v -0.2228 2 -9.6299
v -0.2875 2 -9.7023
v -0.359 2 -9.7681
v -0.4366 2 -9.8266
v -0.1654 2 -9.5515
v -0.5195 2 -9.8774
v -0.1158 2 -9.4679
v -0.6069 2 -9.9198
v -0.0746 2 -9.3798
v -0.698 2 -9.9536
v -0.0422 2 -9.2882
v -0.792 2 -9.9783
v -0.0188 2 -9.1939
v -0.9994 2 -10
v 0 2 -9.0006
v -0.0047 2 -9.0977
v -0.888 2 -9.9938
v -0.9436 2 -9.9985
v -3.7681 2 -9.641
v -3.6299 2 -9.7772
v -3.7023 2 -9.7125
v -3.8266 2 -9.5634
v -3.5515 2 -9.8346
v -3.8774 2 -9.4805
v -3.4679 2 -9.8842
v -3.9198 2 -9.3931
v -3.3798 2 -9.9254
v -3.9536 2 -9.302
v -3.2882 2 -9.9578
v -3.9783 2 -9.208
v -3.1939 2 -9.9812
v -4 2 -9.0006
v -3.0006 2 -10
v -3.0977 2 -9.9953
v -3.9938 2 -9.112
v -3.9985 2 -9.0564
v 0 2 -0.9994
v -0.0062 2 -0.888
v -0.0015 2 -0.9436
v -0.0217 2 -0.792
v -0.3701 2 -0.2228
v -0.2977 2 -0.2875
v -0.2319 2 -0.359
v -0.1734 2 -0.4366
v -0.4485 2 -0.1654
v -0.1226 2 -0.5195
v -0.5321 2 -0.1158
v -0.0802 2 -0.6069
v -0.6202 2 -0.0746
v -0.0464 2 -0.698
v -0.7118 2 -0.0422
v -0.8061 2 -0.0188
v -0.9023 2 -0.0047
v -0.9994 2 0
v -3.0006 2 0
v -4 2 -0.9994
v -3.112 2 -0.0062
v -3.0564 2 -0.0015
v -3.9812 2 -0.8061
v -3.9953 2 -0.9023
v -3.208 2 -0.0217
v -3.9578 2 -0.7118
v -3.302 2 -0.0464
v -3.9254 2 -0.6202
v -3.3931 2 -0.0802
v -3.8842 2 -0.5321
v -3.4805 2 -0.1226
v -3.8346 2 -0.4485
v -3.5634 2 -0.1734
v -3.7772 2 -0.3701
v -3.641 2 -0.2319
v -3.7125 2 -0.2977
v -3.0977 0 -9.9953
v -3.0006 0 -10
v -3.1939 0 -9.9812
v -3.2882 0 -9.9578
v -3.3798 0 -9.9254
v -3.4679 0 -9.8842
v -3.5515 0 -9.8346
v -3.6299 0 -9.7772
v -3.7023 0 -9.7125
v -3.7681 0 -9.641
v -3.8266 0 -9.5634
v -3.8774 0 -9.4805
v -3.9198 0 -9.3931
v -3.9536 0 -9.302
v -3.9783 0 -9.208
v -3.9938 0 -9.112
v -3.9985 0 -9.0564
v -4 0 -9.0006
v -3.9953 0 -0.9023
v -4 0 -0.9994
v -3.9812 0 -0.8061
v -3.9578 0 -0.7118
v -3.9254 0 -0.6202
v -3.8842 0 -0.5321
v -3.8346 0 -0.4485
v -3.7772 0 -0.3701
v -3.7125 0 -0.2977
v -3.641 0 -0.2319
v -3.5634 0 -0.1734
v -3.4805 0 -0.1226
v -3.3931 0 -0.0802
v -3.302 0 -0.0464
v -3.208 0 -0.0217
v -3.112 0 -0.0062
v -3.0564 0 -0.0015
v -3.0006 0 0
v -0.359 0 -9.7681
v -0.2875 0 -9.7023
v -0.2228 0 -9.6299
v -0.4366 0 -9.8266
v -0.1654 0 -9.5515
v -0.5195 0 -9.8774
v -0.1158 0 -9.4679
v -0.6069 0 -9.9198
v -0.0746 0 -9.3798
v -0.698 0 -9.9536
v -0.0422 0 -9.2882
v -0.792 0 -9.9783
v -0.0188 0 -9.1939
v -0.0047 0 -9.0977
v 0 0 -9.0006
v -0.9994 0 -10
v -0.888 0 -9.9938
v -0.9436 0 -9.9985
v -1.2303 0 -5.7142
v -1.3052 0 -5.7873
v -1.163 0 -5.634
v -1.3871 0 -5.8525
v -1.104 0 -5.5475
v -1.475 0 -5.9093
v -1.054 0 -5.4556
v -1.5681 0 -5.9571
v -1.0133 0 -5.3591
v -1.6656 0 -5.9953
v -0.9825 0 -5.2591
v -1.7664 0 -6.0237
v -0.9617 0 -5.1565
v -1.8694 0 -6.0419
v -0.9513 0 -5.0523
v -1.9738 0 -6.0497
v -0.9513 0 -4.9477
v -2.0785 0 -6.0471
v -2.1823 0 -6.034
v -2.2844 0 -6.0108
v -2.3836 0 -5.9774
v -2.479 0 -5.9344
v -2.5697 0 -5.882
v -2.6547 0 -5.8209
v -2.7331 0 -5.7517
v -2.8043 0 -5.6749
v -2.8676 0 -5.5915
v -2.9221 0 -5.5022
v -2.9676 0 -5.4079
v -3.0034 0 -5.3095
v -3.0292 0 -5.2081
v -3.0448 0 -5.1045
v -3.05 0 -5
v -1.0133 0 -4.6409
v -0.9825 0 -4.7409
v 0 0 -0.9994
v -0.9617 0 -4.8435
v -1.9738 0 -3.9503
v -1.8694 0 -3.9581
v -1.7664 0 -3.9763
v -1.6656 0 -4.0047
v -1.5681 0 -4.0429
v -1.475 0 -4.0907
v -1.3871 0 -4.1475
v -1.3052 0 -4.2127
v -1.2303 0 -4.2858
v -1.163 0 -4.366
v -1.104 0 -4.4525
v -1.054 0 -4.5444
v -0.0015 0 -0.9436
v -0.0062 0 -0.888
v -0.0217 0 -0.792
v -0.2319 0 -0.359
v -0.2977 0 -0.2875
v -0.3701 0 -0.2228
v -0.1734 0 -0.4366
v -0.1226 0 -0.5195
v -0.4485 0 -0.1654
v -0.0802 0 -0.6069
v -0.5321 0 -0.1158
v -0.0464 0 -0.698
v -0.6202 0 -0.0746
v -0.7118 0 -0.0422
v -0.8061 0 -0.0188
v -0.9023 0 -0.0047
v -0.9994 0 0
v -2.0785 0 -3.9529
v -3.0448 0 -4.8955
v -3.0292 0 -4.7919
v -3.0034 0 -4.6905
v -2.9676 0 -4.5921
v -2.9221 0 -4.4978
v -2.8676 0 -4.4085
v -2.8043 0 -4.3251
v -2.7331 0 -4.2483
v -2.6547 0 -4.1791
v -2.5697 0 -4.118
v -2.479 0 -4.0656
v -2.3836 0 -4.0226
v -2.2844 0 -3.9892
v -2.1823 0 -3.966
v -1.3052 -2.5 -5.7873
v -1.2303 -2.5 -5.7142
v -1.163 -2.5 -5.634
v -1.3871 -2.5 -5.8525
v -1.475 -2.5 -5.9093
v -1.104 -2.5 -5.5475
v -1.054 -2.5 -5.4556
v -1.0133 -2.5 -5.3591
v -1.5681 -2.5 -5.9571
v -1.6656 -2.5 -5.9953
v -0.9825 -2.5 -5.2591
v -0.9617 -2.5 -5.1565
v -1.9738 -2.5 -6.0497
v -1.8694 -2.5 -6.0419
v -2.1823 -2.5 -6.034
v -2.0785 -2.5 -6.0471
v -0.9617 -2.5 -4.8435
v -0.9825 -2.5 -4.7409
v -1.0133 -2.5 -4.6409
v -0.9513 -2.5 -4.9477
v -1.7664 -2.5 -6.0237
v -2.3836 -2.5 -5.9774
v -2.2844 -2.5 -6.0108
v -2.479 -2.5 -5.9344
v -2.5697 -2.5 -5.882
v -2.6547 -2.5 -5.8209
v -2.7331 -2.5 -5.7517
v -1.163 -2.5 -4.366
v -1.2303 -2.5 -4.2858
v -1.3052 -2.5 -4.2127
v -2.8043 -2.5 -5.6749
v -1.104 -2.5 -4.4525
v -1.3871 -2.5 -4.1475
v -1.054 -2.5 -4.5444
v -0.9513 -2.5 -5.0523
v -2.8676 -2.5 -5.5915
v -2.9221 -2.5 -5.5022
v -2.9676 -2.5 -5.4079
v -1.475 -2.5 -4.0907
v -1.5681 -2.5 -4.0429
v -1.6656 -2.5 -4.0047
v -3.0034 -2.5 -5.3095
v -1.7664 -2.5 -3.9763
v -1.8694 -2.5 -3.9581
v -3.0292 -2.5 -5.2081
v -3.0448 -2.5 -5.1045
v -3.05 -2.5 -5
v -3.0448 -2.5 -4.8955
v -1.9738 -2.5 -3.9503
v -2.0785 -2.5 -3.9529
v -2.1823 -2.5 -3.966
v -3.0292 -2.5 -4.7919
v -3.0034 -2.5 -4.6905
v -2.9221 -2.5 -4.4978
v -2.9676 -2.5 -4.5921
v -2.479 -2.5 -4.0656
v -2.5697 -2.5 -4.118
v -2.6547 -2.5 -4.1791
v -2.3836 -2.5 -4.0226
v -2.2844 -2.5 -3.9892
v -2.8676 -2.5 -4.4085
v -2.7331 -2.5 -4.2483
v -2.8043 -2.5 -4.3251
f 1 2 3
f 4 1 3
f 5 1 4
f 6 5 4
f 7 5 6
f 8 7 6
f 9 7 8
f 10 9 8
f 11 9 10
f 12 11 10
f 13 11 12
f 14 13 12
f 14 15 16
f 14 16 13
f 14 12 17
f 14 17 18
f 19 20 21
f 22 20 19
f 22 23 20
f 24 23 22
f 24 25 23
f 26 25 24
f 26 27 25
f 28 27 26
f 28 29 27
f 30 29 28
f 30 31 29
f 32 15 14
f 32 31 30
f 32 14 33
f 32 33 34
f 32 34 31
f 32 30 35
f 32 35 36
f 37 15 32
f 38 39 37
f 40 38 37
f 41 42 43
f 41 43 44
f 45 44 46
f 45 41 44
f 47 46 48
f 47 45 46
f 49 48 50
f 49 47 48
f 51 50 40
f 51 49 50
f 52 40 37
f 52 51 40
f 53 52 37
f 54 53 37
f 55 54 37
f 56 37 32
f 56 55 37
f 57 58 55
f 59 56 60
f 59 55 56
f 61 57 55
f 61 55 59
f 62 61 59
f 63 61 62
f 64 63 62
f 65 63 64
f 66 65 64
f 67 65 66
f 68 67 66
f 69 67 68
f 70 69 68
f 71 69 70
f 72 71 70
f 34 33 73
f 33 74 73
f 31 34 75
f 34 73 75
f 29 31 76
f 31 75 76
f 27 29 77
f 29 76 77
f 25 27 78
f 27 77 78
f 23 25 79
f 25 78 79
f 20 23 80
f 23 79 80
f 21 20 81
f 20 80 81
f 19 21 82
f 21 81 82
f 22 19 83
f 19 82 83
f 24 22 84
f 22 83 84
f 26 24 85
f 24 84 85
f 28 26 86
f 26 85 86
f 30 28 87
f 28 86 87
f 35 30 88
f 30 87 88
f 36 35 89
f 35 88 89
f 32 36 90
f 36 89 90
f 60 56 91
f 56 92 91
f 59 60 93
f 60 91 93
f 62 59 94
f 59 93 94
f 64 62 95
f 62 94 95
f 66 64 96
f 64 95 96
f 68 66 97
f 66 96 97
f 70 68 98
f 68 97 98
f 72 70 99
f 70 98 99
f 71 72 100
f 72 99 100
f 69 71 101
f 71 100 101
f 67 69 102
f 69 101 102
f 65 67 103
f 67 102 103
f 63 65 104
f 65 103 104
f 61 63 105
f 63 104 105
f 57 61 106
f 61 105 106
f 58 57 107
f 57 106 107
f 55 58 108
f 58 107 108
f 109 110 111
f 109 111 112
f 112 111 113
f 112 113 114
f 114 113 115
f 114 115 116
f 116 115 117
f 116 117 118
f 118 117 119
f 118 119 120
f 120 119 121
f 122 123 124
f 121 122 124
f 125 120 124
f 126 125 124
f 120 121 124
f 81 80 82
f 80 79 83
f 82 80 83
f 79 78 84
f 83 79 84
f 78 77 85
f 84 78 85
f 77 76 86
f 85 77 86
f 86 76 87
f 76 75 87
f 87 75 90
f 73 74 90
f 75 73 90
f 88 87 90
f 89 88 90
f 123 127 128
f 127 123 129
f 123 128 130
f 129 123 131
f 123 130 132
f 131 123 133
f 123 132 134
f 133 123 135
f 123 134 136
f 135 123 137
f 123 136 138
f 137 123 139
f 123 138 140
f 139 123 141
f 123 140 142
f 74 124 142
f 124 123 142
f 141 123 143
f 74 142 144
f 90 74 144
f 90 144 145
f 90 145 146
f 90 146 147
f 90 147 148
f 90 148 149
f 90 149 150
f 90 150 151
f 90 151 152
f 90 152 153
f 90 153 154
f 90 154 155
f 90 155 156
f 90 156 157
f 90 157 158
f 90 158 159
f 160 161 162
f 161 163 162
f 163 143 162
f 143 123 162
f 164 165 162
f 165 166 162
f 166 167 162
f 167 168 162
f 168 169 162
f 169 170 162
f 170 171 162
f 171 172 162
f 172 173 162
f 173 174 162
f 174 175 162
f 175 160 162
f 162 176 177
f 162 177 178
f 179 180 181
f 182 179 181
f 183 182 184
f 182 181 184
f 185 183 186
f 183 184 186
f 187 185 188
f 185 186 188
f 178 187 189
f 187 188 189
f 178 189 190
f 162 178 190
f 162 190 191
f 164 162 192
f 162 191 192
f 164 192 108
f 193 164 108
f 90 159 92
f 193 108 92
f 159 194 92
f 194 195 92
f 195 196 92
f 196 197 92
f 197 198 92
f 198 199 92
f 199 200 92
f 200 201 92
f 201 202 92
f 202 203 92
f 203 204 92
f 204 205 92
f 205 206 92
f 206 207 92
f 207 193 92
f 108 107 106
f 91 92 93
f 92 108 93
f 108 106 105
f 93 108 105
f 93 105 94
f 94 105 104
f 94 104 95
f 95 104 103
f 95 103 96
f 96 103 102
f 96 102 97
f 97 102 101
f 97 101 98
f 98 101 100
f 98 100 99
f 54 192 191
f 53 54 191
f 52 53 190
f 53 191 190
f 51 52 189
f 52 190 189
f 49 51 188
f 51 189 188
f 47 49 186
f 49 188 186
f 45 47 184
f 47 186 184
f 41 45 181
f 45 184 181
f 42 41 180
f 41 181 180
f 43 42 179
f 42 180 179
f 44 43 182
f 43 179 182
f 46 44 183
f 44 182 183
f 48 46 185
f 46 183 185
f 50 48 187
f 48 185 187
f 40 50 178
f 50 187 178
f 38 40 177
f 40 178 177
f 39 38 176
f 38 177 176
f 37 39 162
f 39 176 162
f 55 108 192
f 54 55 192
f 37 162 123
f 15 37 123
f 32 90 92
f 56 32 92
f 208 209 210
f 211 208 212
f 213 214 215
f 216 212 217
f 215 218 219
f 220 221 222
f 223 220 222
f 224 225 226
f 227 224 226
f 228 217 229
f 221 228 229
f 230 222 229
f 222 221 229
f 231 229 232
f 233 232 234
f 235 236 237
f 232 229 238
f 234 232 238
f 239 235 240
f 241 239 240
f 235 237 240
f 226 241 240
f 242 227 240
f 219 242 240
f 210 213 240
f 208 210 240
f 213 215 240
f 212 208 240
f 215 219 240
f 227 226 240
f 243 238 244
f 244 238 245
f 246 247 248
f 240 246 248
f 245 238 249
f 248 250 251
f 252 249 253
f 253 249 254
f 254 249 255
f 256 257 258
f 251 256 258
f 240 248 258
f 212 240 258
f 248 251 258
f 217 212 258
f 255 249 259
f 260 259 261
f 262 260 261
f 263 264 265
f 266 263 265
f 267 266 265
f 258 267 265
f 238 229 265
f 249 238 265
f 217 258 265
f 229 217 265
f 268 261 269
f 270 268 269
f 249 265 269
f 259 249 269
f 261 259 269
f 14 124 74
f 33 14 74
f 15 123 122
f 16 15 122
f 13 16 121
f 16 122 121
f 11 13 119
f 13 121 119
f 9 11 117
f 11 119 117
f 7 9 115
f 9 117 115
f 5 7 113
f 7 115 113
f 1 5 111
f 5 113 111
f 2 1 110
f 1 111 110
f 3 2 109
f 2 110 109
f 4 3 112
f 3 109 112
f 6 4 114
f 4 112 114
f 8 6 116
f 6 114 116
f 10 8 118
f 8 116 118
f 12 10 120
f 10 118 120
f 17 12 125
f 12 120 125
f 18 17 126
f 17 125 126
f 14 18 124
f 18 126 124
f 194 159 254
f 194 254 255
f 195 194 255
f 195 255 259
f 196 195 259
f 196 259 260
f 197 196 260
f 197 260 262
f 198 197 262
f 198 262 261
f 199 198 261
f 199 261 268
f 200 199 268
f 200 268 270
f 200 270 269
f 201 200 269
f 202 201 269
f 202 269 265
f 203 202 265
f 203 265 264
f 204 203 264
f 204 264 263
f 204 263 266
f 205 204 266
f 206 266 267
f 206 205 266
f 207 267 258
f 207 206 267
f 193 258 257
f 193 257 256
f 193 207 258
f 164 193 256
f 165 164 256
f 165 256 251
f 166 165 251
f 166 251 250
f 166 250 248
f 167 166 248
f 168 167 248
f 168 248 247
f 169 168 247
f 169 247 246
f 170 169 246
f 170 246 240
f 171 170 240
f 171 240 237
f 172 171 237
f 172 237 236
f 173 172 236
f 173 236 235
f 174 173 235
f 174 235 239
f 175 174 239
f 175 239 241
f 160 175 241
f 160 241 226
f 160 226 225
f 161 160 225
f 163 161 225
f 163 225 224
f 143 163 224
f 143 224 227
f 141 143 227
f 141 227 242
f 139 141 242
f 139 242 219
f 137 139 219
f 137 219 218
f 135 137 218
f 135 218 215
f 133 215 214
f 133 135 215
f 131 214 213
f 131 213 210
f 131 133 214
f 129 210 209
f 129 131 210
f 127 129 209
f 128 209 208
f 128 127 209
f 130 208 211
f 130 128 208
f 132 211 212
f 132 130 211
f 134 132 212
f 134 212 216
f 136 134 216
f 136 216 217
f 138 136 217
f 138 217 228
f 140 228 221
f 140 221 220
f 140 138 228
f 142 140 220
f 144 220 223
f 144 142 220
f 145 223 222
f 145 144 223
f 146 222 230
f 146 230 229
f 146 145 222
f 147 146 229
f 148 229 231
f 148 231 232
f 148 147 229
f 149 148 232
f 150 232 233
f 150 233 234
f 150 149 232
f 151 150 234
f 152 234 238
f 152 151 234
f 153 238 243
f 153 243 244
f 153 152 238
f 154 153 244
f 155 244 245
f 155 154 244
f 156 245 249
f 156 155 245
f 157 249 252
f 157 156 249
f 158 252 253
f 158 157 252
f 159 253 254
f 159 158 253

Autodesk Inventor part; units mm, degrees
ref_plane "YZ Plane" through (0, 0, 0) normal (1, 0, 0) x (0, 1, 0)
ref_plane "XZ Plane" through (0, 0, 0) normal (0, 1, 0) x (-1, 0, 0)
ref_plane "XY Plane" through (0, 0, 0) normal (0, 0, 1) x (1, 0, 0)
sketch "Sketch1" plane through (0, 0, 0) normal (0, 1, 0) x (-1, 0, 0)
  line L0 (0.9994, -10) -> (3.0006, -10)
  ellipse E0 centre (2.9994, -8.9994) end of major axis (3.7074, -9.7074) minor radius 1 (3.0006, -10) -> (4, -9.0006) ccw
  line L1 (4, -9.0006) -> (4, -0.9994)
  ellipse E1 centre (2.9994, -1.0006) end of major axis (3.7074, -0.2926) minor radius 1 (4, -0.9994) -> (3.0006, 0) ccw
  line L2 (3.0006, 0) -> (0.9994, 0)
  ellipse E2 centre (1.0006, -1.0006) end of major axis (1.7086, -1.7086) minor radius 1 (0.9994, 0) -> (0, -0.9994) ccw
  line L3 (0, -0.9994) -> (0, -9.0006)
  ellipse E3 centre (1.0006, -8.9994) end of major axis (1.7086, -8.2914) minor radius 1 (0, -9.0006) -> (0.9994, -10) ccw
  circle A0 centre (2, -5) radius 1.75
  circle A1 centre (2, -5) radius 1.25
  line L4 (0, 0) -> (4, 0)
  line L5 (4, 0) -> (4, -10)
  line L6 (4, -10) -> (0, -10)
  line L7 (0, -10) -> (0, 0)
  circle A2 centre (2, -5) radius 1.05
  point P0 (0, -5)
  dimension "d3" = 1
  dimension "d7" = 1.0013
  dimension "d0" = 2.5
  dimension "d1" = 4
  dimension "d2" = 10
  dimension "d4" = 2
  dimension "d5" = 3.5
  dimension "d13" = 5
  dimension "d20" = 0.2
extrude "Extrusion1" add sketch "Sketch1" along normal blind 2 contours E3 L3 E2 L2 E1 L1 E0 L0 | A0 | A1 | A2
extrude "Extrusion2" add sketch "Sketch1" against normal blind 2.5 contours A2
properties part number "flipper_robot_v1_flipper_adapter"
